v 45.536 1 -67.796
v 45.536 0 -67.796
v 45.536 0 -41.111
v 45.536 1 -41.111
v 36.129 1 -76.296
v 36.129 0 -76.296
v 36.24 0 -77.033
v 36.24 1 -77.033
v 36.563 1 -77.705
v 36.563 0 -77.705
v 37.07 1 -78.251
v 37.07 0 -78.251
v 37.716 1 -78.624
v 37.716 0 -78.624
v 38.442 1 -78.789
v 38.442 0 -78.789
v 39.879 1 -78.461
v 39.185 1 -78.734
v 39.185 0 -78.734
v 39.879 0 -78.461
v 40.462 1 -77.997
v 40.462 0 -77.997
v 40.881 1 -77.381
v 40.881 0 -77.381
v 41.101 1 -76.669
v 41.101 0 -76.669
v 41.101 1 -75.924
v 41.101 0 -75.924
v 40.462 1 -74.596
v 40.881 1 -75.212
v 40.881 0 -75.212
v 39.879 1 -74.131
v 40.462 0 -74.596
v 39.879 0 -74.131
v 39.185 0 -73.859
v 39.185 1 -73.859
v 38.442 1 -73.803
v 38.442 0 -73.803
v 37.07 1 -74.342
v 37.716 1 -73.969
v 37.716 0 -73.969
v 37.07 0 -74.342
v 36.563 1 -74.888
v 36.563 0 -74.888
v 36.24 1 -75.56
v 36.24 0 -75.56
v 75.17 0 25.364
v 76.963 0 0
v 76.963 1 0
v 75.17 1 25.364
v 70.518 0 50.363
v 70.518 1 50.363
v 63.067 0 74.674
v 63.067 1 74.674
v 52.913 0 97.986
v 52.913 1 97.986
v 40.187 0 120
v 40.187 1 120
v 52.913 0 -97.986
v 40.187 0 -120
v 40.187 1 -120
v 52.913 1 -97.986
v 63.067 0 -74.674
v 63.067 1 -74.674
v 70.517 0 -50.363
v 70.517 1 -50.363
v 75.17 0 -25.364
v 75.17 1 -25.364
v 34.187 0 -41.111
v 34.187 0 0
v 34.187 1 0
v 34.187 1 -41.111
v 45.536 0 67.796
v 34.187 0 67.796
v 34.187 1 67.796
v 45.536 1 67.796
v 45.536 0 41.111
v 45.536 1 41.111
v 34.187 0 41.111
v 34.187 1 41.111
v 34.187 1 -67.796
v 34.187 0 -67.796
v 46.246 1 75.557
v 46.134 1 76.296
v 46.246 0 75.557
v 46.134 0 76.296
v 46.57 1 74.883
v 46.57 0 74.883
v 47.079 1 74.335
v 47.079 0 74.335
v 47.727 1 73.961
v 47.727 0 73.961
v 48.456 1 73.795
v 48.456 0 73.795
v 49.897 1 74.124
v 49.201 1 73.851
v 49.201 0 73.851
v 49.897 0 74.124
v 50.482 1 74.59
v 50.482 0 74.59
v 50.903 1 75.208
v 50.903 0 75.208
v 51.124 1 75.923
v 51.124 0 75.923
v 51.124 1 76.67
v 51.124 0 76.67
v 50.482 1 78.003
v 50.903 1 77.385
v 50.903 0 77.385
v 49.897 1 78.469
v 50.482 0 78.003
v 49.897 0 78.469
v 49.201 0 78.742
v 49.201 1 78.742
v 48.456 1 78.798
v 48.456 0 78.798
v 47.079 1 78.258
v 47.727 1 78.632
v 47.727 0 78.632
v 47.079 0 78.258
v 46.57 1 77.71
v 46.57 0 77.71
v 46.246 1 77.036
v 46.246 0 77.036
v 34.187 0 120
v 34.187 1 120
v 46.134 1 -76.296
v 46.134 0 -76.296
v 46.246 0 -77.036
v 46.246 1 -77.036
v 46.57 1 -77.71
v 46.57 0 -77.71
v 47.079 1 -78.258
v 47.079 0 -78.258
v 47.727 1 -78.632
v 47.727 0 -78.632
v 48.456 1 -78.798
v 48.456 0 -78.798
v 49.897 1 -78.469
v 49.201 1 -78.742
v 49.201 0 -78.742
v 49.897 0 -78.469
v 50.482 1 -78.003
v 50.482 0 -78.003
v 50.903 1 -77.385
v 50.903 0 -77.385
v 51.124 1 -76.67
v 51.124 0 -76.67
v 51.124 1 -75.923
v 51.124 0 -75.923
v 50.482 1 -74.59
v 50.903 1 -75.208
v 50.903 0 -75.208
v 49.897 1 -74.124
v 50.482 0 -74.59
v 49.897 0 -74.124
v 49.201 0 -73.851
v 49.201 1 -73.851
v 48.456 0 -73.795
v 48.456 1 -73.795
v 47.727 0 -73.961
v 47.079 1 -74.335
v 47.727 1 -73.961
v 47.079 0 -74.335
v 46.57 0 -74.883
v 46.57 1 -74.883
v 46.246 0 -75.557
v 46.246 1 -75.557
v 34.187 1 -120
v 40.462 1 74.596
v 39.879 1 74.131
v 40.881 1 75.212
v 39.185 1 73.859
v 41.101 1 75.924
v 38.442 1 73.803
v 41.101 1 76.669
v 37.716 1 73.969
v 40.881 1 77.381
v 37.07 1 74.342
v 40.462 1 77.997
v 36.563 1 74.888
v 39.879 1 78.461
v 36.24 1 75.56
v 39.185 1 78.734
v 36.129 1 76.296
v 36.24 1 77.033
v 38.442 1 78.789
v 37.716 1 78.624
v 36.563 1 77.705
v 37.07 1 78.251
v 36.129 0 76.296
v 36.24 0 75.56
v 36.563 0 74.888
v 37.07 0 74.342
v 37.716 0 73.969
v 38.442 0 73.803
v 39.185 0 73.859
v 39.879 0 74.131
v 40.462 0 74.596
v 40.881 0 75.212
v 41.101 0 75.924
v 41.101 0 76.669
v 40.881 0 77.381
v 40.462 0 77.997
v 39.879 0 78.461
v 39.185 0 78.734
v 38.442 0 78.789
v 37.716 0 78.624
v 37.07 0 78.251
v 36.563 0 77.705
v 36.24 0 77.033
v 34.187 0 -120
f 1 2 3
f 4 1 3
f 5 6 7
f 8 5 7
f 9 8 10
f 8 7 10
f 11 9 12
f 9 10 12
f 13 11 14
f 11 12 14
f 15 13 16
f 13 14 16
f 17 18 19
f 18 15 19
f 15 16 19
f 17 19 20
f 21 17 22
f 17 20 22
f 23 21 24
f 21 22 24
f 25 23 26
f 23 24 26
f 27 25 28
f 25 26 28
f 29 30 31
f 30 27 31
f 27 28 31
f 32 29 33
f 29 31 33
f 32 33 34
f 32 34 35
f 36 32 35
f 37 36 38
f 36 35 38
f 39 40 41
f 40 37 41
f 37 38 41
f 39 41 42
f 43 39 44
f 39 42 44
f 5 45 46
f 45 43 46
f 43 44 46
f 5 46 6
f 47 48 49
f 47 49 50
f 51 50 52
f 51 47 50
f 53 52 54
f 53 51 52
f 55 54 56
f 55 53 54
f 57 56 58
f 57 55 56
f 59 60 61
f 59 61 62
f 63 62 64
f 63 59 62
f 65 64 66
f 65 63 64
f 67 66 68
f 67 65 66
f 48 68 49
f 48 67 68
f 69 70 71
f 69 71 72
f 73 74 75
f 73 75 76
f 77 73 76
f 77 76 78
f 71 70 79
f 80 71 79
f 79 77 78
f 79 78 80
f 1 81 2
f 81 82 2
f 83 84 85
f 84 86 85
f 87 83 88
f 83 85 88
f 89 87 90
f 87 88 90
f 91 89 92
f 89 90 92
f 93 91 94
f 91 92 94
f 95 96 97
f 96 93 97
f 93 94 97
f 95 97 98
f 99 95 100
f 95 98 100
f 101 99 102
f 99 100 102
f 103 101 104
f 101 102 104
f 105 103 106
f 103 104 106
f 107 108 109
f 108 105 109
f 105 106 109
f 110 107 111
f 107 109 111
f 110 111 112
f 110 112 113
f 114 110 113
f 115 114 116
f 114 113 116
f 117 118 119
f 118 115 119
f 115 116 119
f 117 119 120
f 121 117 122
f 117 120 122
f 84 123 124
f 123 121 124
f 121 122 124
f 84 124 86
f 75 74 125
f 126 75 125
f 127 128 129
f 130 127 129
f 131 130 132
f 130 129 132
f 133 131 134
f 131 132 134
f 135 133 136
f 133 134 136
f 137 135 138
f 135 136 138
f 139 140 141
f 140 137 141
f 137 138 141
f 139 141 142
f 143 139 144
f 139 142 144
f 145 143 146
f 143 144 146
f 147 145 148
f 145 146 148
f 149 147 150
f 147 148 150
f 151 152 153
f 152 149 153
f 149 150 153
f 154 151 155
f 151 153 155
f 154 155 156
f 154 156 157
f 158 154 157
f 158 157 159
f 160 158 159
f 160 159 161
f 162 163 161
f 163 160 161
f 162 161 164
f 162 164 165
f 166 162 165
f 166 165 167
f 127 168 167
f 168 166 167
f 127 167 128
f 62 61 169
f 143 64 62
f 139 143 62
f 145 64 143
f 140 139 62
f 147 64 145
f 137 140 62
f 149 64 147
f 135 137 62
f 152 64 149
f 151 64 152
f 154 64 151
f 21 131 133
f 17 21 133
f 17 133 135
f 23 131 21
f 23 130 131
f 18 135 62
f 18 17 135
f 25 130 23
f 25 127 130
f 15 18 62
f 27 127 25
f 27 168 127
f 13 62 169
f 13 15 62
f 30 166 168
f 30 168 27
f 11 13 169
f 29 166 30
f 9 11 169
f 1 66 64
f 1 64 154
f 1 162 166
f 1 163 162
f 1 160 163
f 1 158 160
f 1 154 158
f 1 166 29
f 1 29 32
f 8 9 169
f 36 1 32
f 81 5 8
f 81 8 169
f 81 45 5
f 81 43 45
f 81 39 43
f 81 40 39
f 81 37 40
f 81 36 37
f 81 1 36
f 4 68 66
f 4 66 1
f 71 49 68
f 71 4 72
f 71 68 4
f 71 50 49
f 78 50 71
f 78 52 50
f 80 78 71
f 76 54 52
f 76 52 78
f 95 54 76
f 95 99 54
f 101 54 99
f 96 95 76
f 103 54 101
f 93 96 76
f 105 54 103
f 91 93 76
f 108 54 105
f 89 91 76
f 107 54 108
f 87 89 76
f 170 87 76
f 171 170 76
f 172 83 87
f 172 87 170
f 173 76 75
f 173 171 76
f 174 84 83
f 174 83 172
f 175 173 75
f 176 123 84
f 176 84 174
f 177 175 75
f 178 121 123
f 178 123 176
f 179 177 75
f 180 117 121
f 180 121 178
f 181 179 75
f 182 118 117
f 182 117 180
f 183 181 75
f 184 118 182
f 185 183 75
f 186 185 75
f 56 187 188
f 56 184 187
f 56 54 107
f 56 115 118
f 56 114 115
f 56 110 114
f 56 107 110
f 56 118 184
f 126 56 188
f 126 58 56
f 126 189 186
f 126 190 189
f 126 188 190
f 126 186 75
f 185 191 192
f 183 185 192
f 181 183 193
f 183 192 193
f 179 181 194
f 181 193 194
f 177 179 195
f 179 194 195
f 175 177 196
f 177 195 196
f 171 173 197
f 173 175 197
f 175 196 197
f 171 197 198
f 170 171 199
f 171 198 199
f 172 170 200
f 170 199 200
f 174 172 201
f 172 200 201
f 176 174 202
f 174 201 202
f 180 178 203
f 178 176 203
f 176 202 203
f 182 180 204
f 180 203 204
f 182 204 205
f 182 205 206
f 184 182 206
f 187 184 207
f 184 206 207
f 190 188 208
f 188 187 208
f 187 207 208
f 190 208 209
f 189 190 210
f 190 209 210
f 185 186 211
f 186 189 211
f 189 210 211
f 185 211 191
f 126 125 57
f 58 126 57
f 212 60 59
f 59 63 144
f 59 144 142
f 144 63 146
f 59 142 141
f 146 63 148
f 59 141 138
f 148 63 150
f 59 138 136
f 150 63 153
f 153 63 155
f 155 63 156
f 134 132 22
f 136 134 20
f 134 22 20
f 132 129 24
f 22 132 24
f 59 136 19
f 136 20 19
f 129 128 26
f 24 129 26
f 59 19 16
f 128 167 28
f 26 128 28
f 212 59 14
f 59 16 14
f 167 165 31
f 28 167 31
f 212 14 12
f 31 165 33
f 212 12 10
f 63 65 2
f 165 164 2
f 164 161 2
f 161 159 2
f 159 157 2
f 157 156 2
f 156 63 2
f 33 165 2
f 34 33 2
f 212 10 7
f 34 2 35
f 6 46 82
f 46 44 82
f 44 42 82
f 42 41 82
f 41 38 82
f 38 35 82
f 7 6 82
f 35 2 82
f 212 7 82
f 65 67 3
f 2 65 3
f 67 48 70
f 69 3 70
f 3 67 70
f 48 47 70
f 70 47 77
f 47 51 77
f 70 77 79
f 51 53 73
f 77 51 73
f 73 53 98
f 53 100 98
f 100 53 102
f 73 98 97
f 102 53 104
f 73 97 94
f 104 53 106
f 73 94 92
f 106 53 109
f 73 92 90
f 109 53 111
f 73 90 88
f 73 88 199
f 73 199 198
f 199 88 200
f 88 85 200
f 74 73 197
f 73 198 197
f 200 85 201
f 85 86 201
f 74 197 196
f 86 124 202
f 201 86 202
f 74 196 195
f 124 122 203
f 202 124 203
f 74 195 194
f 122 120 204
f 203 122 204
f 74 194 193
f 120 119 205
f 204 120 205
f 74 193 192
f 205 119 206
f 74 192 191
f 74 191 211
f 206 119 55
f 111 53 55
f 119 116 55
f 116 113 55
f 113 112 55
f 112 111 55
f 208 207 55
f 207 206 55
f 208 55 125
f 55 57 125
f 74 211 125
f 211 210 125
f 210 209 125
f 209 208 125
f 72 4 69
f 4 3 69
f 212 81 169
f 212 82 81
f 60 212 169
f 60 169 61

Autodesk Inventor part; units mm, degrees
ref_plane "YZ Plane" through (0, 0, 0) normal (1, 0, 0) x (0, 1, 0)
ref_plane "XZ Plane" through (0, 0, 0) normal (0, 1, 0) x (-1, 0, 0)
ref_plane "XY Plane" through (0, 0, 0) normal (0, 0, 1) x (1, 0, 0)
sketch "Esboço1" plane through (0, 0, 0) normal (0, 1, 0) x (-1, 0, 0)
  line L0 (-30.1128, 0) -> (-45.5357, 0)
  line L1 (-34.1868, -120) -> (-40.1868, -120)
  arc A0 (-76.9634, 0) -> (-40.1868, -120) centre (147.3829, 3.1204) ccw
  line L2 (-34.1868, -67.7964) -> (-45.5357, -67.7964)
  line L3 (-45.5357, -67.7964) -> (-45.5357, -41.1109)
  line L4 (-45.5357, -41.1109) -> (-34.1868, -41.1109)
  line L5 (-34.1868, 0) -> (-34.1868, -41.1109)
  line L6 (-34.1868, -67.7964) -> (-34.1868, -120)
  circle A1 centre (-38.629, -76.2964) radius 2.5
  circle A2 centre (-38.629, -76.2964) radius 2.5
  circle A3 centre (-48.643, -76.2964) radius 2.5086
  line L7 (-34.1868, 120) -> (-40.1868, 120)
  arc A4 (-40.1868, 120) -> (-76.9634, 0) centre (147.3829, -3.1204) ccw
  line L8 (-34.1868, 67.7964) -> (-45.5357, 67.7964)
  line L9 (-45.5357, 67.7964) -> (-45.5357, 41.1109)
  line L10 (-45.5357, 41.1109) -> (-34.1868, 41.1109)
  line L11 (-34.1868, 0) -> (-34.1868, 41.1109)
  line L12 (-34.1868, 67.7964) -> (-34.1868, 120)
  circle A5 centre (-38.629, 76.2964) radius 2.5
  circle A6 centre (-48.643, 76.2964) radius 2.5086
  point P0 (0, 0)
  point P1 (0, 0)
  dimension "d0" = 120
  dimension "d1" = 6
extrude "Extrusão1" add sketch "Esboço1" along normal blind 1
sketch "Esboço2" plane through (0, 0, 0) normal (0, 1, 0) x (-1, 0, 0)
  point P0 (0, 0)
sketch "Esboço3" plane through (0, 0, 0) normal (0, -1, 0) x (1, 0, 0)
  line L0 (45.5357, 41.1109) -> (45.5357, 67.7964) projected
  line L1 (45.5357, 41.1109) -> (45.5357, 52.7605)
  point P0 (0, 0)
properties part number "sensores1"
